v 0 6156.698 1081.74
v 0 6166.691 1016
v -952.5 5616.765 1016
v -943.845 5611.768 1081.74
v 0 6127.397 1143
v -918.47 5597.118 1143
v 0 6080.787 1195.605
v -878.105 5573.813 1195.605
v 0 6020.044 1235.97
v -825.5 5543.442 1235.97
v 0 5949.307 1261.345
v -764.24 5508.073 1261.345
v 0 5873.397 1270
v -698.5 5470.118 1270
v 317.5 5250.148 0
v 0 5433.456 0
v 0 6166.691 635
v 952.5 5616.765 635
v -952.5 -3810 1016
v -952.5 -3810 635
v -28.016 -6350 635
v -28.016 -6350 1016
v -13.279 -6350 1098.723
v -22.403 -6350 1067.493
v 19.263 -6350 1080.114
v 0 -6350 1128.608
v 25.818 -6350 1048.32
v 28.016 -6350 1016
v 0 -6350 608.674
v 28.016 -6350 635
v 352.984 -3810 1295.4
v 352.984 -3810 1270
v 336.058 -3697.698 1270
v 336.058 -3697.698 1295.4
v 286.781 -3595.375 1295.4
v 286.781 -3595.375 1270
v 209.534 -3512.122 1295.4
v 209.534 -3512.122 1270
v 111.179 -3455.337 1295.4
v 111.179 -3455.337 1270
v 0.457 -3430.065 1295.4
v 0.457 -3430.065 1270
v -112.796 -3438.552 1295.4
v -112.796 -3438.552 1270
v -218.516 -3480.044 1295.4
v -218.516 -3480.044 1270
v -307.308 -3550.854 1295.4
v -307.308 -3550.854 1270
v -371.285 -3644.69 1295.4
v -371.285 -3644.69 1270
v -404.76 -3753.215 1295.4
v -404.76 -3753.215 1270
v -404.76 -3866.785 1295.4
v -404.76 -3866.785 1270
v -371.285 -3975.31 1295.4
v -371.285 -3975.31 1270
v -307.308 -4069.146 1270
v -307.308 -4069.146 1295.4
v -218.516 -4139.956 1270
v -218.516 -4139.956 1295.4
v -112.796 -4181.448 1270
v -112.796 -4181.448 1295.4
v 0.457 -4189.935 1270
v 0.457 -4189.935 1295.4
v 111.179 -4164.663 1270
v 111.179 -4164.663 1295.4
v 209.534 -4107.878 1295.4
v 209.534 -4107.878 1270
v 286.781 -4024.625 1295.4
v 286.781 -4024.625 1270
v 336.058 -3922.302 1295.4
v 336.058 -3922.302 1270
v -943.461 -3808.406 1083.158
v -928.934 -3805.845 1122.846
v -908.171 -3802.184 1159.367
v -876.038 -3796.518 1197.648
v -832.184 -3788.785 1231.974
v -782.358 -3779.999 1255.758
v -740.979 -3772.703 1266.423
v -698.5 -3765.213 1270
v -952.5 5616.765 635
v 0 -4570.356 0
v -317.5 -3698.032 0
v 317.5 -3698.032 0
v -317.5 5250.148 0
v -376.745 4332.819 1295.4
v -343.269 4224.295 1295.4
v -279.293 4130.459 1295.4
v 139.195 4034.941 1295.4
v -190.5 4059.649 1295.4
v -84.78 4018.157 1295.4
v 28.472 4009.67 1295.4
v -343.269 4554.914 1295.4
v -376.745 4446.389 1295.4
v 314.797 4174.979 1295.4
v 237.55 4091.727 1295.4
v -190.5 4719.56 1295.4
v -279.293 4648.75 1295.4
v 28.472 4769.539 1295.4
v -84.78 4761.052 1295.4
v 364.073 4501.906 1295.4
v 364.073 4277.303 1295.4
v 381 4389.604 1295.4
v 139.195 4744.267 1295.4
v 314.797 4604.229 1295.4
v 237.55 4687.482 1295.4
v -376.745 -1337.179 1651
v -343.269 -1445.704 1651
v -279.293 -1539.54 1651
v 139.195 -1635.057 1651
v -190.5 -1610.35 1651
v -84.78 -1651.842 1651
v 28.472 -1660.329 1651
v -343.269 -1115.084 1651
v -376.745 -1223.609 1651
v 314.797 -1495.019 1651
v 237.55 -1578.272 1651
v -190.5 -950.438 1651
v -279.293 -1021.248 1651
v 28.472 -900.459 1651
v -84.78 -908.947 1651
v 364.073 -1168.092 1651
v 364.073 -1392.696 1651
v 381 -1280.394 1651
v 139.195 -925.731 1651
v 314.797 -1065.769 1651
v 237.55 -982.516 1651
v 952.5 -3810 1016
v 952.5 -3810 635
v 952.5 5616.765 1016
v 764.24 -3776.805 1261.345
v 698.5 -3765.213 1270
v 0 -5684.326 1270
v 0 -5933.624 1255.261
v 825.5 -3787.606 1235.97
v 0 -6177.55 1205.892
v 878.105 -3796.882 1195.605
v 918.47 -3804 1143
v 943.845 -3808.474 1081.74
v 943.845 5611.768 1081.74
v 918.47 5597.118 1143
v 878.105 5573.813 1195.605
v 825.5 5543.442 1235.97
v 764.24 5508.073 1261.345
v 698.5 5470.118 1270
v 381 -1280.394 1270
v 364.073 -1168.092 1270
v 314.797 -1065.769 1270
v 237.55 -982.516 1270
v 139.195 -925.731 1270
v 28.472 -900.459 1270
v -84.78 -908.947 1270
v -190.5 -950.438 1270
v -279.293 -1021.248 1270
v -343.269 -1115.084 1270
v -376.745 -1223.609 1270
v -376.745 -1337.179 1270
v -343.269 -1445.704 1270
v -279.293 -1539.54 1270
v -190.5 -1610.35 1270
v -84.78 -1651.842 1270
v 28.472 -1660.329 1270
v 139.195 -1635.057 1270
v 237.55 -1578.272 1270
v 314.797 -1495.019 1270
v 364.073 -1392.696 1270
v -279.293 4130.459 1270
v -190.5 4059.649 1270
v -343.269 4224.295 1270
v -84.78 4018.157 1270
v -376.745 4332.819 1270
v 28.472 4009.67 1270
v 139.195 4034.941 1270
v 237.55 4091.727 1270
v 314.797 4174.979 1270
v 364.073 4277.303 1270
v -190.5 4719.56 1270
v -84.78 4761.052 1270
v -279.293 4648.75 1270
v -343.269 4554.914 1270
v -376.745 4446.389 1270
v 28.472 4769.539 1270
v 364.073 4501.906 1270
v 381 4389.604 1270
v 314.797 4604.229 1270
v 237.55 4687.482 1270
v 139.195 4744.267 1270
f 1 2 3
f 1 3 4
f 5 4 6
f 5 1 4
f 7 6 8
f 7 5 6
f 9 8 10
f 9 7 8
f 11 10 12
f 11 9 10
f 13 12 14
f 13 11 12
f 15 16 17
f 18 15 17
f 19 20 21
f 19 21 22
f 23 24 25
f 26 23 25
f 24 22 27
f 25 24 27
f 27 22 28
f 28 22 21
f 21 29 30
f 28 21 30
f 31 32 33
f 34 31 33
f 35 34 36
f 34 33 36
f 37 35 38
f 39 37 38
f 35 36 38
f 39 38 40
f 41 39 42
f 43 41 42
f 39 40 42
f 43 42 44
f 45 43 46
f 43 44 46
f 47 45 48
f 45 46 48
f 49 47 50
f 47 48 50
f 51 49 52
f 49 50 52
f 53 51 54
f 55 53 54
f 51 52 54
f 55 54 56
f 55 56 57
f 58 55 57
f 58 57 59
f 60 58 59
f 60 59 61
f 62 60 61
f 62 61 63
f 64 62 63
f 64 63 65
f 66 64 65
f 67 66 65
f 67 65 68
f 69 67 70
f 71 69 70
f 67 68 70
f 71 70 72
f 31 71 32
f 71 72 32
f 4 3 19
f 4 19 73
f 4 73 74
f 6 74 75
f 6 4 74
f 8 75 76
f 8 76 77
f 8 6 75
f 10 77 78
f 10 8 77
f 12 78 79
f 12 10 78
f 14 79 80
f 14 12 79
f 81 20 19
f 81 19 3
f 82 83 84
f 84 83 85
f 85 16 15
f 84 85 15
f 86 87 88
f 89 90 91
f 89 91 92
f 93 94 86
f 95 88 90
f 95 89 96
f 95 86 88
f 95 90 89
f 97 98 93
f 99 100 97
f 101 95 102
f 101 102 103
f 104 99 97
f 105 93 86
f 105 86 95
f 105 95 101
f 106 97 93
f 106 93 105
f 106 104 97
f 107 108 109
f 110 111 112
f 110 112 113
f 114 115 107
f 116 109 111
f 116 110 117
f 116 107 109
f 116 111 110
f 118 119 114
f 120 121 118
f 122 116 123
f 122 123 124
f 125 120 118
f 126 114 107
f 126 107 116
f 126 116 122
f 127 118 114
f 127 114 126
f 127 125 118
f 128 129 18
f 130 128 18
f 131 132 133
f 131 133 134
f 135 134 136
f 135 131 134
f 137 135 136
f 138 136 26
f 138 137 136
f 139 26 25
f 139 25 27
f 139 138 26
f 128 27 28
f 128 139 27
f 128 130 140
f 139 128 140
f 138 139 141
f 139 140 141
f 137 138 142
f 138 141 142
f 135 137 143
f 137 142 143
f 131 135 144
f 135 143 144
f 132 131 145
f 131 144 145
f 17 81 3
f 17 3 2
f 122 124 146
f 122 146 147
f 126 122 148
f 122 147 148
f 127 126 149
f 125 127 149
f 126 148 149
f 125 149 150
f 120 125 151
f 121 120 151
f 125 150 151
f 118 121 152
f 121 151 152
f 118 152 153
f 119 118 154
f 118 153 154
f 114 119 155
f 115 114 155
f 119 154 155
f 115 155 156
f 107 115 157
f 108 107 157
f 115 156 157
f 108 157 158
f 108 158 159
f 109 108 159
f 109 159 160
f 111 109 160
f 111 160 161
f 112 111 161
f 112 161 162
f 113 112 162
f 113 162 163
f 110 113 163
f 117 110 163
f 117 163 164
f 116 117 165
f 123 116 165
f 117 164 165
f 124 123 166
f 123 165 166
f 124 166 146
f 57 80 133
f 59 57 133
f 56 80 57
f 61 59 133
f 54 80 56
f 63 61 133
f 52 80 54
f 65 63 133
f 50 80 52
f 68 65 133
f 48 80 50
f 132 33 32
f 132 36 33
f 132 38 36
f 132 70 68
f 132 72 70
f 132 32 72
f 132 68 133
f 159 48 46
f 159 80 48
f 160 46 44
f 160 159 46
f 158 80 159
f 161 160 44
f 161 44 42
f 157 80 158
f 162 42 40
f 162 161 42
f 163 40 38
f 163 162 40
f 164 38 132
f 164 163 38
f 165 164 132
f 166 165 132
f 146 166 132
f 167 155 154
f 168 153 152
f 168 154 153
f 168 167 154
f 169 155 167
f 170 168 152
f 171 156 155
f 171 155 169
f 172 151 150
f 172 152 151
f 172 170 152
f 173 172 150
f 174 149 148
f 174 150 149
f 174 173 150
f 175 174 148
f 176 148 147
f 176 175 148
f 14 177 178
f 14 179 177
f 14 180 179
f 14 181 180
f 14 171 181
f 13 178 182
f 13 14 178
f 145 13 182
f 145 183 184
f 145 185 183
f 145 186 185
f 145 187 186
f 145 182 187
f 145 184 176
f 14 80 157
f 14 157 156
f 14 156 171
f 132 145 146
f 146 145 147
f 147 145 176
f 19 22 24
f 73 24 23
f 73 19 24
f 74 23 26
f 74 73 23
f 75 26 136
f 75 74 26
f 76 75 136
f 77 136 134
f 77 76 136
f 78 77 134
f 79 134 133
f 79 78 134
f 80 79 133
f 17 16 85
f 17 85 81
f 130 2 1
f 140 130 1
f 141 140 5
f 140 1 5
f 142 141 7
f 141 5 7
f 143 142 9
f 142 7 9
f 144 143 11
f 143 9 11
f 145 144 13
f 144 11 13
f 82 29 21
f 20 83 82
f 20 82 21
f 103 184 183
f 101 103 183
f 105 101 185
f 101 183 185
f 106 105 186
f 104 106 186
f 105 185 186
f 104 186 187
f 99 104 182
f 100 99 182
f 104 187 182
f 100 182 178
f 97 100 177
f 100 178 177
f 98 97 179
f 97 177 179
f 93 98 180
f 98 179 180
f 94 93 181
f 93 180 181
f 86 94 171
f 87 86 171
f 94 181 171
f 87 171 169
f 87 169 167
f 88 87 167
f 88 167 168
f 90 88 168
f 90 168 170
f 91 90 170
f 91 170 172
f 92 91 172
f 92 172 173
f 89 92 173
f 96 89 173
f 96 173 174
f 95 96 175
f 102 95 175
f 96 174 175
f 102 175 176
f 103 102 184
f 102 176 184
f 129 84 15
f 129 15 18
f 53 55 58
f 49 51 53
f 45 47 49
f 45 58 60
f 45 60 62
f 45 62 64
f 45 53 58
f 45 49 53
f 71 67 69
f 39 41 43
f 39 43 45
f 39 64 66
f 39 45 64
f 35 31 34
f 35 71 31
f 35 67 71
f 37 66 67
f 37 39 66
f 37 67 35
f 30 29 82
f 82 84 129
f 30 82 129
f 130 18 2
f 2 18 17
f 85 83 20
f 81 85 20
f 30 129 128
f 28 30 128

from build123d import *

# Parameters (mm, degrees)
F0_W          = 1905
F0_H          = 12700
F1_DEPTH      = 1270
F2_SIZE2      = 924.4843950362
F2_SIZE       = 2540
F2_2_SIZE2    = 924.4843950362
F2_2_SIZE     = 2540
F3_T1_DEPTH   = 7841.1978168008
F4_R          = 381
F5_DEPTH      = 381
F6_R          = 381
F7_DEPTH      = 25.4
F8_R          = 381
F9_DEPTH      = 25.4
F10_T1_DEPTH  = 7112.1620249564
F10_T3_DEPTH  = 13835.9156409968
F10_T5_DEPTH  = 4365.8896575229
F10_T7_DEPTH  = 4365.8896575229
F10_T9_DEPTH  = 7112.1620249564
F10_T14_DEPTH = 3322.0686046444
F10_T19_DEPTH = 3322.0686046444
F11_T1_DEPTH  = 11141.2651581292
F11_T3_DEPTH  = 4417.5115420888
F11_T5_DEPTH  = 4417.5115420888
F11_T7_DEPTH  = 2369.8522628062
F11_T9_DEPTH  = 2369.8522628062


# Not quite as in the source:
# - a fillet or chamfer that OpenCascade refuses, or shapes differently, is made with other operations: its cross-section is extruded or revolved along the edge and cut away or added


with BuildPart() as f1:
    # F0 (on Top) → F1 (new body)
    with BuildSketch(Plane.XY):
        Rectangle(F0_W, F0_H)
    extrude(amount=F1_DEPTH)

    # F2
    f2_edges = [f1.edges().sort_by_distance(p)[0] for p in [
        (952.5, -6350, 635),
    ]]
    f2_side = f1.faces().sort_by_distance((952.5, 0, 635))[0]
    chamfer(f2_edges, length=F2_SIZE, length2=F2_SIZE2, reference=f2_side)

    # F2#2
    f2_2_edges = [f1.edges().sort_by_distance(p)[0] for p in [
        (-952.5, -6350, 635),
    ]]
    f2_2_side = f1.faces().sort_by_distance((-952.5, 0, 635))[0]
    chamfer(f2_2_edges, length=F2_2_SIZE, length2=F2_2_SIZE2, reference=f2_2_side)

    # F3: chamfer of 1270 x 733.2348418708 on 2 edges, made by hand

    # F3_s2 → F3_t1 (cut)
    with BuildSketch(Plane.XY.offset(-3285.5989084004)):
        Polygon((952.5, 5616.7651581292), (-317.5, 6350), (952.5, 6350), align=None)
        Polygon((-952.5, 5616.7651581292), (317.5, 6350), (-952.5, 6350), align=None)
    extrude(amount=F3_T1_DEPTH, mode=Mode.SUBTRACT)

    # F4 (on face) → F5 (join)
    with BuildSketch(Plane.XY.offset(1270)):
        with Locations((0, -1280.3941220168)):
            Circle(F4_R)
    extrude(amount=F5_DEPTH)

    # F6 (on face) → F7 (join)
    with BuildSketch(Plane.XY.offset(1270)):
        with Locations((0, 4389.6043354776)):
            Circle(F6_R)
    extrude(amount=F7_DEPTH)

    # F8 (on face) → F9 (join)
    with BuildSketch(Plane.XY.offset(1270)):
        with Locations((-28.0156049638, -3810)):
            Circle(F8_R)
    extrude(amount=F9_DEPTH)

    # F10: chamfer of 635 on 7 edges, made by hand

    # F10_s2 → F10_t1 (cut)
    with BuildSketch(Plane(origin=(163.5960713175, -449.4765118562, 0), x_dir=(0, 0, 1), z_dir=(0.3420201433, -0.9396926208, 0))):
        Polygon((0, 1563.1539673694), (635, 2198.1539673694), (0, 2198.1539673694), align=None)
    extrude(amount=F10_T1_DEPTH, mode=Mode.SUBTRACT)

    # F10_s4 → F10_t3 (cut)
    with BuildSketch(Plane.XZ.offset(-7249.7838554876)):
        Polygon((-317.5, 0), (-952.5, 635), (-952.5, 0), align=None)
        Polygon((317.5, 0), (952.5, 635), (952.5, 0), align=None)
    extrude(amount=F10_T3_DEPTH, mode=Mode.SUBTRACT)

    # F10_s6 → F10_t5 (cut)
    with BuildSketch(Plane(origin=(4084.4913337829, 2358.1821710622, 0), x_dir=(0, 0, 1), z_dir=(-0.8660254038, -0.5, 0))):
        Polygon((0, 4705.5113140312), (635, 5340.5113140312), (0, 5340.5113140312), align=None)
    extrude(amount=F10_T5_DEPTH, mode=Mode.SUBTRACT)

    # F10_s8 → F10_t7 (cut)
    with BuildSketch(Plane(origin=(-4084.4913337829, 2358.1821710622, 0), x_dir=(0, 0, 1), z_dir=(0.8660254038, -0.5, 0))):
        Polygon((0, -4705.5113140312), (635, -5340.5113140312), (0, -5340.5113140312), align=None)
    extrude(amount=F10_T7_DEPTH, mode=Mode.SUBTRACT)

    # F10_s10 → F10_t9 (cut)
    with BuildSketch(Plane(origin=(-163.5960713175, -449.4765118562, 0), x_dir=(0, 0, 1), z_dir=(-0.3420201433, -0.9396926208, 0))):
        Polygon((0, -1563.1539673694), (635, -2198.1539673694), (0, -2198.1539673694), align=None)
    extrude(amount=F10_T9_DEPTH, mode=Mode.SUBTRACT)


with BuildPart() as f10_tool12:
    # F10_s13 → F10_t14 (new body)
    with BuildSketch(Plane.YZ.offset(-1661.0343023222)):
        Polygon((-6350, 635), (-5715, 0), (-6350, 0), align=None)
    extrude(amount=F10_T14_DEPTH)

    split(bisect_by=Plane(origin=(-734.4421241446, -267.3150719799, -781.5769836847), x_dir=(0.3420201433, -0.9396926208, 0), z_dir=(-0.6644630244, -0.2418447626, -0.7071067812)), keep=Keep.TOP)


with BuildPart() as f1_1:
    add(f1.part)

    # F10_t11: cut F10_tool12
    add(f10_tool12.part, mode=Mode.SUBTRACT)


with BuildPart() as f10_tool17:
    # F10_s18 → F10_t19 (new body)
    with BuildSketch(Plane.YZ.offset(-1661.0343023222)):
        Polygon((-6350, 635), (-5715, 0), (-6350, 0), align=None)
    extrude(amount=F10_T19_DEPTH)

    split(bisect_by=Plane(origin=(734.4421241446, -267.3150719799, -781.5769836847), x_dir=(0.3420201433, 0.9396926208, 0), z_dir=(0.6644630244, -0.2418447626, -0.7071067812)), keep=Keep.TOP)


with BuildPart() as f1_2:
    add(f1_1.part)

    # F10_t16: cut F10_tool17
    add(f10_tool17.part, mode=Mode.SUBTRACT)

    # F11: fillet of radius 254 on 6 edges, made by hand

    # F11_s2 → F11_t1 (cut)
    with BuildSketch(Plane.XZ.offset(-6251.7651581292)):
        with BuildLine():
            ThreePointArc((952.5, 1016), (878.1051224214, 1195.6051224214), (698.5, 1270))
            Line((698.5, 1270), (952.5, 1270))
            Line((952.5, 1270), (952.5, 1016))
        make_face()
        with BuildLine():
            ThreePointArc((-952.5, 1016), (-878.1051224214, 1195.6051224214), (-698.5, 1270))
            Line((-698.5, 1270), (-952.5, 1270))
            Line((-952.5, 1270), (-952.5, 1016))
        make_face()
    extrude(amount=F11_T1_DEPTH, mode=Mode.SUBTRACT)

    # F11_s4 → F11_t3 (cut)
    with BuildSketch(Plane(origin=(-743.8783177682, -2043.78888089, 0), x_dir=(0, 0, 1), z_dir=(-0.3420201433, -0.9396926208, 0))):
        with BuildLine():
            ThreePointArc((1270, -1944.1539673694), (1195.6051224214, -2123.7590897908), (1016, -2198.1539673694))
            Line((1016, -2198.1539673694), (1270, -2198.1539673694))
            Line((1270, -2198.1539673694), (1270, -1944.1539673694))
        make_face()
    extrude(amount=F11_T3_DEPTH, mode=Mode.SUBTRACT)

    # F11_s6 → F11_t5 (cut)
    with BuildSketch(Plane(origin=(743.8783177682, -2043.7888808901, 0), x_dir=(0, 0, 1), z_dir=(0.3420201433, -0.9396926208, 0))):
        with BuildLine():
            ThreePointArc((1016, 2198.1539673694), (1195.6051224214, 2123.7590897907), (1270, 1944.1539673694))
            Line((1270, 1944.1539673694), (1270, 2198.1539673694))
            Line((1270, 2198.1539673694), (1016, 2198.1539673694))
        make_face()
    extrude(amount=F11_T5_DEPTH, mode=Mode.SUBTRACT)

    # F11_s8 → F11_t7 (cut)
    with BuildSketch(Plane(origin=(3220.1817884187, 1859.172822383, 0), x_dir=(0, 0, 1), z_dir=(-0.8660254038, -0.5, 0))):
        with BuildLine():
            ThreePointArc((1016, 5340.5113140312), (1195.6051224214, 5266.1164364526), (1270, 5086.5113140312))
            Line((1270, 5086.5113140312), (1270, 5340.5113140312))
            Line((1270, 5340.5113140312), (1016, 5340.5113140312))
        make_face()
    extrude(amount=F11_T7_DEPTH, mode=Mode.SUBTRACT)

    # F11_s10 → F11_t9 (cut)
    with BuildSketch(Plane(origin=(-3220.1817884187, 1859.172822383, 0), x_dir=(0, 0, 1), z_dir=(0.8660254038, -0.5, 0))):
        with BuildLine():
            ThreePointArc((1016, -5340.5113140312), (1195.6051224214, -5266.1164364526), (1270, -5086.5113140312))
            Line((1270, -5086.5113140312), (1270, -5340.5113140312))
            Line((1270, -5340.5113140312), (1016, -5340.5113140312))
        make_face()
    extrude(amount=F11_T9_DEPTH, mode=Mode.SUBTRACT)


solid = f1_2.part
